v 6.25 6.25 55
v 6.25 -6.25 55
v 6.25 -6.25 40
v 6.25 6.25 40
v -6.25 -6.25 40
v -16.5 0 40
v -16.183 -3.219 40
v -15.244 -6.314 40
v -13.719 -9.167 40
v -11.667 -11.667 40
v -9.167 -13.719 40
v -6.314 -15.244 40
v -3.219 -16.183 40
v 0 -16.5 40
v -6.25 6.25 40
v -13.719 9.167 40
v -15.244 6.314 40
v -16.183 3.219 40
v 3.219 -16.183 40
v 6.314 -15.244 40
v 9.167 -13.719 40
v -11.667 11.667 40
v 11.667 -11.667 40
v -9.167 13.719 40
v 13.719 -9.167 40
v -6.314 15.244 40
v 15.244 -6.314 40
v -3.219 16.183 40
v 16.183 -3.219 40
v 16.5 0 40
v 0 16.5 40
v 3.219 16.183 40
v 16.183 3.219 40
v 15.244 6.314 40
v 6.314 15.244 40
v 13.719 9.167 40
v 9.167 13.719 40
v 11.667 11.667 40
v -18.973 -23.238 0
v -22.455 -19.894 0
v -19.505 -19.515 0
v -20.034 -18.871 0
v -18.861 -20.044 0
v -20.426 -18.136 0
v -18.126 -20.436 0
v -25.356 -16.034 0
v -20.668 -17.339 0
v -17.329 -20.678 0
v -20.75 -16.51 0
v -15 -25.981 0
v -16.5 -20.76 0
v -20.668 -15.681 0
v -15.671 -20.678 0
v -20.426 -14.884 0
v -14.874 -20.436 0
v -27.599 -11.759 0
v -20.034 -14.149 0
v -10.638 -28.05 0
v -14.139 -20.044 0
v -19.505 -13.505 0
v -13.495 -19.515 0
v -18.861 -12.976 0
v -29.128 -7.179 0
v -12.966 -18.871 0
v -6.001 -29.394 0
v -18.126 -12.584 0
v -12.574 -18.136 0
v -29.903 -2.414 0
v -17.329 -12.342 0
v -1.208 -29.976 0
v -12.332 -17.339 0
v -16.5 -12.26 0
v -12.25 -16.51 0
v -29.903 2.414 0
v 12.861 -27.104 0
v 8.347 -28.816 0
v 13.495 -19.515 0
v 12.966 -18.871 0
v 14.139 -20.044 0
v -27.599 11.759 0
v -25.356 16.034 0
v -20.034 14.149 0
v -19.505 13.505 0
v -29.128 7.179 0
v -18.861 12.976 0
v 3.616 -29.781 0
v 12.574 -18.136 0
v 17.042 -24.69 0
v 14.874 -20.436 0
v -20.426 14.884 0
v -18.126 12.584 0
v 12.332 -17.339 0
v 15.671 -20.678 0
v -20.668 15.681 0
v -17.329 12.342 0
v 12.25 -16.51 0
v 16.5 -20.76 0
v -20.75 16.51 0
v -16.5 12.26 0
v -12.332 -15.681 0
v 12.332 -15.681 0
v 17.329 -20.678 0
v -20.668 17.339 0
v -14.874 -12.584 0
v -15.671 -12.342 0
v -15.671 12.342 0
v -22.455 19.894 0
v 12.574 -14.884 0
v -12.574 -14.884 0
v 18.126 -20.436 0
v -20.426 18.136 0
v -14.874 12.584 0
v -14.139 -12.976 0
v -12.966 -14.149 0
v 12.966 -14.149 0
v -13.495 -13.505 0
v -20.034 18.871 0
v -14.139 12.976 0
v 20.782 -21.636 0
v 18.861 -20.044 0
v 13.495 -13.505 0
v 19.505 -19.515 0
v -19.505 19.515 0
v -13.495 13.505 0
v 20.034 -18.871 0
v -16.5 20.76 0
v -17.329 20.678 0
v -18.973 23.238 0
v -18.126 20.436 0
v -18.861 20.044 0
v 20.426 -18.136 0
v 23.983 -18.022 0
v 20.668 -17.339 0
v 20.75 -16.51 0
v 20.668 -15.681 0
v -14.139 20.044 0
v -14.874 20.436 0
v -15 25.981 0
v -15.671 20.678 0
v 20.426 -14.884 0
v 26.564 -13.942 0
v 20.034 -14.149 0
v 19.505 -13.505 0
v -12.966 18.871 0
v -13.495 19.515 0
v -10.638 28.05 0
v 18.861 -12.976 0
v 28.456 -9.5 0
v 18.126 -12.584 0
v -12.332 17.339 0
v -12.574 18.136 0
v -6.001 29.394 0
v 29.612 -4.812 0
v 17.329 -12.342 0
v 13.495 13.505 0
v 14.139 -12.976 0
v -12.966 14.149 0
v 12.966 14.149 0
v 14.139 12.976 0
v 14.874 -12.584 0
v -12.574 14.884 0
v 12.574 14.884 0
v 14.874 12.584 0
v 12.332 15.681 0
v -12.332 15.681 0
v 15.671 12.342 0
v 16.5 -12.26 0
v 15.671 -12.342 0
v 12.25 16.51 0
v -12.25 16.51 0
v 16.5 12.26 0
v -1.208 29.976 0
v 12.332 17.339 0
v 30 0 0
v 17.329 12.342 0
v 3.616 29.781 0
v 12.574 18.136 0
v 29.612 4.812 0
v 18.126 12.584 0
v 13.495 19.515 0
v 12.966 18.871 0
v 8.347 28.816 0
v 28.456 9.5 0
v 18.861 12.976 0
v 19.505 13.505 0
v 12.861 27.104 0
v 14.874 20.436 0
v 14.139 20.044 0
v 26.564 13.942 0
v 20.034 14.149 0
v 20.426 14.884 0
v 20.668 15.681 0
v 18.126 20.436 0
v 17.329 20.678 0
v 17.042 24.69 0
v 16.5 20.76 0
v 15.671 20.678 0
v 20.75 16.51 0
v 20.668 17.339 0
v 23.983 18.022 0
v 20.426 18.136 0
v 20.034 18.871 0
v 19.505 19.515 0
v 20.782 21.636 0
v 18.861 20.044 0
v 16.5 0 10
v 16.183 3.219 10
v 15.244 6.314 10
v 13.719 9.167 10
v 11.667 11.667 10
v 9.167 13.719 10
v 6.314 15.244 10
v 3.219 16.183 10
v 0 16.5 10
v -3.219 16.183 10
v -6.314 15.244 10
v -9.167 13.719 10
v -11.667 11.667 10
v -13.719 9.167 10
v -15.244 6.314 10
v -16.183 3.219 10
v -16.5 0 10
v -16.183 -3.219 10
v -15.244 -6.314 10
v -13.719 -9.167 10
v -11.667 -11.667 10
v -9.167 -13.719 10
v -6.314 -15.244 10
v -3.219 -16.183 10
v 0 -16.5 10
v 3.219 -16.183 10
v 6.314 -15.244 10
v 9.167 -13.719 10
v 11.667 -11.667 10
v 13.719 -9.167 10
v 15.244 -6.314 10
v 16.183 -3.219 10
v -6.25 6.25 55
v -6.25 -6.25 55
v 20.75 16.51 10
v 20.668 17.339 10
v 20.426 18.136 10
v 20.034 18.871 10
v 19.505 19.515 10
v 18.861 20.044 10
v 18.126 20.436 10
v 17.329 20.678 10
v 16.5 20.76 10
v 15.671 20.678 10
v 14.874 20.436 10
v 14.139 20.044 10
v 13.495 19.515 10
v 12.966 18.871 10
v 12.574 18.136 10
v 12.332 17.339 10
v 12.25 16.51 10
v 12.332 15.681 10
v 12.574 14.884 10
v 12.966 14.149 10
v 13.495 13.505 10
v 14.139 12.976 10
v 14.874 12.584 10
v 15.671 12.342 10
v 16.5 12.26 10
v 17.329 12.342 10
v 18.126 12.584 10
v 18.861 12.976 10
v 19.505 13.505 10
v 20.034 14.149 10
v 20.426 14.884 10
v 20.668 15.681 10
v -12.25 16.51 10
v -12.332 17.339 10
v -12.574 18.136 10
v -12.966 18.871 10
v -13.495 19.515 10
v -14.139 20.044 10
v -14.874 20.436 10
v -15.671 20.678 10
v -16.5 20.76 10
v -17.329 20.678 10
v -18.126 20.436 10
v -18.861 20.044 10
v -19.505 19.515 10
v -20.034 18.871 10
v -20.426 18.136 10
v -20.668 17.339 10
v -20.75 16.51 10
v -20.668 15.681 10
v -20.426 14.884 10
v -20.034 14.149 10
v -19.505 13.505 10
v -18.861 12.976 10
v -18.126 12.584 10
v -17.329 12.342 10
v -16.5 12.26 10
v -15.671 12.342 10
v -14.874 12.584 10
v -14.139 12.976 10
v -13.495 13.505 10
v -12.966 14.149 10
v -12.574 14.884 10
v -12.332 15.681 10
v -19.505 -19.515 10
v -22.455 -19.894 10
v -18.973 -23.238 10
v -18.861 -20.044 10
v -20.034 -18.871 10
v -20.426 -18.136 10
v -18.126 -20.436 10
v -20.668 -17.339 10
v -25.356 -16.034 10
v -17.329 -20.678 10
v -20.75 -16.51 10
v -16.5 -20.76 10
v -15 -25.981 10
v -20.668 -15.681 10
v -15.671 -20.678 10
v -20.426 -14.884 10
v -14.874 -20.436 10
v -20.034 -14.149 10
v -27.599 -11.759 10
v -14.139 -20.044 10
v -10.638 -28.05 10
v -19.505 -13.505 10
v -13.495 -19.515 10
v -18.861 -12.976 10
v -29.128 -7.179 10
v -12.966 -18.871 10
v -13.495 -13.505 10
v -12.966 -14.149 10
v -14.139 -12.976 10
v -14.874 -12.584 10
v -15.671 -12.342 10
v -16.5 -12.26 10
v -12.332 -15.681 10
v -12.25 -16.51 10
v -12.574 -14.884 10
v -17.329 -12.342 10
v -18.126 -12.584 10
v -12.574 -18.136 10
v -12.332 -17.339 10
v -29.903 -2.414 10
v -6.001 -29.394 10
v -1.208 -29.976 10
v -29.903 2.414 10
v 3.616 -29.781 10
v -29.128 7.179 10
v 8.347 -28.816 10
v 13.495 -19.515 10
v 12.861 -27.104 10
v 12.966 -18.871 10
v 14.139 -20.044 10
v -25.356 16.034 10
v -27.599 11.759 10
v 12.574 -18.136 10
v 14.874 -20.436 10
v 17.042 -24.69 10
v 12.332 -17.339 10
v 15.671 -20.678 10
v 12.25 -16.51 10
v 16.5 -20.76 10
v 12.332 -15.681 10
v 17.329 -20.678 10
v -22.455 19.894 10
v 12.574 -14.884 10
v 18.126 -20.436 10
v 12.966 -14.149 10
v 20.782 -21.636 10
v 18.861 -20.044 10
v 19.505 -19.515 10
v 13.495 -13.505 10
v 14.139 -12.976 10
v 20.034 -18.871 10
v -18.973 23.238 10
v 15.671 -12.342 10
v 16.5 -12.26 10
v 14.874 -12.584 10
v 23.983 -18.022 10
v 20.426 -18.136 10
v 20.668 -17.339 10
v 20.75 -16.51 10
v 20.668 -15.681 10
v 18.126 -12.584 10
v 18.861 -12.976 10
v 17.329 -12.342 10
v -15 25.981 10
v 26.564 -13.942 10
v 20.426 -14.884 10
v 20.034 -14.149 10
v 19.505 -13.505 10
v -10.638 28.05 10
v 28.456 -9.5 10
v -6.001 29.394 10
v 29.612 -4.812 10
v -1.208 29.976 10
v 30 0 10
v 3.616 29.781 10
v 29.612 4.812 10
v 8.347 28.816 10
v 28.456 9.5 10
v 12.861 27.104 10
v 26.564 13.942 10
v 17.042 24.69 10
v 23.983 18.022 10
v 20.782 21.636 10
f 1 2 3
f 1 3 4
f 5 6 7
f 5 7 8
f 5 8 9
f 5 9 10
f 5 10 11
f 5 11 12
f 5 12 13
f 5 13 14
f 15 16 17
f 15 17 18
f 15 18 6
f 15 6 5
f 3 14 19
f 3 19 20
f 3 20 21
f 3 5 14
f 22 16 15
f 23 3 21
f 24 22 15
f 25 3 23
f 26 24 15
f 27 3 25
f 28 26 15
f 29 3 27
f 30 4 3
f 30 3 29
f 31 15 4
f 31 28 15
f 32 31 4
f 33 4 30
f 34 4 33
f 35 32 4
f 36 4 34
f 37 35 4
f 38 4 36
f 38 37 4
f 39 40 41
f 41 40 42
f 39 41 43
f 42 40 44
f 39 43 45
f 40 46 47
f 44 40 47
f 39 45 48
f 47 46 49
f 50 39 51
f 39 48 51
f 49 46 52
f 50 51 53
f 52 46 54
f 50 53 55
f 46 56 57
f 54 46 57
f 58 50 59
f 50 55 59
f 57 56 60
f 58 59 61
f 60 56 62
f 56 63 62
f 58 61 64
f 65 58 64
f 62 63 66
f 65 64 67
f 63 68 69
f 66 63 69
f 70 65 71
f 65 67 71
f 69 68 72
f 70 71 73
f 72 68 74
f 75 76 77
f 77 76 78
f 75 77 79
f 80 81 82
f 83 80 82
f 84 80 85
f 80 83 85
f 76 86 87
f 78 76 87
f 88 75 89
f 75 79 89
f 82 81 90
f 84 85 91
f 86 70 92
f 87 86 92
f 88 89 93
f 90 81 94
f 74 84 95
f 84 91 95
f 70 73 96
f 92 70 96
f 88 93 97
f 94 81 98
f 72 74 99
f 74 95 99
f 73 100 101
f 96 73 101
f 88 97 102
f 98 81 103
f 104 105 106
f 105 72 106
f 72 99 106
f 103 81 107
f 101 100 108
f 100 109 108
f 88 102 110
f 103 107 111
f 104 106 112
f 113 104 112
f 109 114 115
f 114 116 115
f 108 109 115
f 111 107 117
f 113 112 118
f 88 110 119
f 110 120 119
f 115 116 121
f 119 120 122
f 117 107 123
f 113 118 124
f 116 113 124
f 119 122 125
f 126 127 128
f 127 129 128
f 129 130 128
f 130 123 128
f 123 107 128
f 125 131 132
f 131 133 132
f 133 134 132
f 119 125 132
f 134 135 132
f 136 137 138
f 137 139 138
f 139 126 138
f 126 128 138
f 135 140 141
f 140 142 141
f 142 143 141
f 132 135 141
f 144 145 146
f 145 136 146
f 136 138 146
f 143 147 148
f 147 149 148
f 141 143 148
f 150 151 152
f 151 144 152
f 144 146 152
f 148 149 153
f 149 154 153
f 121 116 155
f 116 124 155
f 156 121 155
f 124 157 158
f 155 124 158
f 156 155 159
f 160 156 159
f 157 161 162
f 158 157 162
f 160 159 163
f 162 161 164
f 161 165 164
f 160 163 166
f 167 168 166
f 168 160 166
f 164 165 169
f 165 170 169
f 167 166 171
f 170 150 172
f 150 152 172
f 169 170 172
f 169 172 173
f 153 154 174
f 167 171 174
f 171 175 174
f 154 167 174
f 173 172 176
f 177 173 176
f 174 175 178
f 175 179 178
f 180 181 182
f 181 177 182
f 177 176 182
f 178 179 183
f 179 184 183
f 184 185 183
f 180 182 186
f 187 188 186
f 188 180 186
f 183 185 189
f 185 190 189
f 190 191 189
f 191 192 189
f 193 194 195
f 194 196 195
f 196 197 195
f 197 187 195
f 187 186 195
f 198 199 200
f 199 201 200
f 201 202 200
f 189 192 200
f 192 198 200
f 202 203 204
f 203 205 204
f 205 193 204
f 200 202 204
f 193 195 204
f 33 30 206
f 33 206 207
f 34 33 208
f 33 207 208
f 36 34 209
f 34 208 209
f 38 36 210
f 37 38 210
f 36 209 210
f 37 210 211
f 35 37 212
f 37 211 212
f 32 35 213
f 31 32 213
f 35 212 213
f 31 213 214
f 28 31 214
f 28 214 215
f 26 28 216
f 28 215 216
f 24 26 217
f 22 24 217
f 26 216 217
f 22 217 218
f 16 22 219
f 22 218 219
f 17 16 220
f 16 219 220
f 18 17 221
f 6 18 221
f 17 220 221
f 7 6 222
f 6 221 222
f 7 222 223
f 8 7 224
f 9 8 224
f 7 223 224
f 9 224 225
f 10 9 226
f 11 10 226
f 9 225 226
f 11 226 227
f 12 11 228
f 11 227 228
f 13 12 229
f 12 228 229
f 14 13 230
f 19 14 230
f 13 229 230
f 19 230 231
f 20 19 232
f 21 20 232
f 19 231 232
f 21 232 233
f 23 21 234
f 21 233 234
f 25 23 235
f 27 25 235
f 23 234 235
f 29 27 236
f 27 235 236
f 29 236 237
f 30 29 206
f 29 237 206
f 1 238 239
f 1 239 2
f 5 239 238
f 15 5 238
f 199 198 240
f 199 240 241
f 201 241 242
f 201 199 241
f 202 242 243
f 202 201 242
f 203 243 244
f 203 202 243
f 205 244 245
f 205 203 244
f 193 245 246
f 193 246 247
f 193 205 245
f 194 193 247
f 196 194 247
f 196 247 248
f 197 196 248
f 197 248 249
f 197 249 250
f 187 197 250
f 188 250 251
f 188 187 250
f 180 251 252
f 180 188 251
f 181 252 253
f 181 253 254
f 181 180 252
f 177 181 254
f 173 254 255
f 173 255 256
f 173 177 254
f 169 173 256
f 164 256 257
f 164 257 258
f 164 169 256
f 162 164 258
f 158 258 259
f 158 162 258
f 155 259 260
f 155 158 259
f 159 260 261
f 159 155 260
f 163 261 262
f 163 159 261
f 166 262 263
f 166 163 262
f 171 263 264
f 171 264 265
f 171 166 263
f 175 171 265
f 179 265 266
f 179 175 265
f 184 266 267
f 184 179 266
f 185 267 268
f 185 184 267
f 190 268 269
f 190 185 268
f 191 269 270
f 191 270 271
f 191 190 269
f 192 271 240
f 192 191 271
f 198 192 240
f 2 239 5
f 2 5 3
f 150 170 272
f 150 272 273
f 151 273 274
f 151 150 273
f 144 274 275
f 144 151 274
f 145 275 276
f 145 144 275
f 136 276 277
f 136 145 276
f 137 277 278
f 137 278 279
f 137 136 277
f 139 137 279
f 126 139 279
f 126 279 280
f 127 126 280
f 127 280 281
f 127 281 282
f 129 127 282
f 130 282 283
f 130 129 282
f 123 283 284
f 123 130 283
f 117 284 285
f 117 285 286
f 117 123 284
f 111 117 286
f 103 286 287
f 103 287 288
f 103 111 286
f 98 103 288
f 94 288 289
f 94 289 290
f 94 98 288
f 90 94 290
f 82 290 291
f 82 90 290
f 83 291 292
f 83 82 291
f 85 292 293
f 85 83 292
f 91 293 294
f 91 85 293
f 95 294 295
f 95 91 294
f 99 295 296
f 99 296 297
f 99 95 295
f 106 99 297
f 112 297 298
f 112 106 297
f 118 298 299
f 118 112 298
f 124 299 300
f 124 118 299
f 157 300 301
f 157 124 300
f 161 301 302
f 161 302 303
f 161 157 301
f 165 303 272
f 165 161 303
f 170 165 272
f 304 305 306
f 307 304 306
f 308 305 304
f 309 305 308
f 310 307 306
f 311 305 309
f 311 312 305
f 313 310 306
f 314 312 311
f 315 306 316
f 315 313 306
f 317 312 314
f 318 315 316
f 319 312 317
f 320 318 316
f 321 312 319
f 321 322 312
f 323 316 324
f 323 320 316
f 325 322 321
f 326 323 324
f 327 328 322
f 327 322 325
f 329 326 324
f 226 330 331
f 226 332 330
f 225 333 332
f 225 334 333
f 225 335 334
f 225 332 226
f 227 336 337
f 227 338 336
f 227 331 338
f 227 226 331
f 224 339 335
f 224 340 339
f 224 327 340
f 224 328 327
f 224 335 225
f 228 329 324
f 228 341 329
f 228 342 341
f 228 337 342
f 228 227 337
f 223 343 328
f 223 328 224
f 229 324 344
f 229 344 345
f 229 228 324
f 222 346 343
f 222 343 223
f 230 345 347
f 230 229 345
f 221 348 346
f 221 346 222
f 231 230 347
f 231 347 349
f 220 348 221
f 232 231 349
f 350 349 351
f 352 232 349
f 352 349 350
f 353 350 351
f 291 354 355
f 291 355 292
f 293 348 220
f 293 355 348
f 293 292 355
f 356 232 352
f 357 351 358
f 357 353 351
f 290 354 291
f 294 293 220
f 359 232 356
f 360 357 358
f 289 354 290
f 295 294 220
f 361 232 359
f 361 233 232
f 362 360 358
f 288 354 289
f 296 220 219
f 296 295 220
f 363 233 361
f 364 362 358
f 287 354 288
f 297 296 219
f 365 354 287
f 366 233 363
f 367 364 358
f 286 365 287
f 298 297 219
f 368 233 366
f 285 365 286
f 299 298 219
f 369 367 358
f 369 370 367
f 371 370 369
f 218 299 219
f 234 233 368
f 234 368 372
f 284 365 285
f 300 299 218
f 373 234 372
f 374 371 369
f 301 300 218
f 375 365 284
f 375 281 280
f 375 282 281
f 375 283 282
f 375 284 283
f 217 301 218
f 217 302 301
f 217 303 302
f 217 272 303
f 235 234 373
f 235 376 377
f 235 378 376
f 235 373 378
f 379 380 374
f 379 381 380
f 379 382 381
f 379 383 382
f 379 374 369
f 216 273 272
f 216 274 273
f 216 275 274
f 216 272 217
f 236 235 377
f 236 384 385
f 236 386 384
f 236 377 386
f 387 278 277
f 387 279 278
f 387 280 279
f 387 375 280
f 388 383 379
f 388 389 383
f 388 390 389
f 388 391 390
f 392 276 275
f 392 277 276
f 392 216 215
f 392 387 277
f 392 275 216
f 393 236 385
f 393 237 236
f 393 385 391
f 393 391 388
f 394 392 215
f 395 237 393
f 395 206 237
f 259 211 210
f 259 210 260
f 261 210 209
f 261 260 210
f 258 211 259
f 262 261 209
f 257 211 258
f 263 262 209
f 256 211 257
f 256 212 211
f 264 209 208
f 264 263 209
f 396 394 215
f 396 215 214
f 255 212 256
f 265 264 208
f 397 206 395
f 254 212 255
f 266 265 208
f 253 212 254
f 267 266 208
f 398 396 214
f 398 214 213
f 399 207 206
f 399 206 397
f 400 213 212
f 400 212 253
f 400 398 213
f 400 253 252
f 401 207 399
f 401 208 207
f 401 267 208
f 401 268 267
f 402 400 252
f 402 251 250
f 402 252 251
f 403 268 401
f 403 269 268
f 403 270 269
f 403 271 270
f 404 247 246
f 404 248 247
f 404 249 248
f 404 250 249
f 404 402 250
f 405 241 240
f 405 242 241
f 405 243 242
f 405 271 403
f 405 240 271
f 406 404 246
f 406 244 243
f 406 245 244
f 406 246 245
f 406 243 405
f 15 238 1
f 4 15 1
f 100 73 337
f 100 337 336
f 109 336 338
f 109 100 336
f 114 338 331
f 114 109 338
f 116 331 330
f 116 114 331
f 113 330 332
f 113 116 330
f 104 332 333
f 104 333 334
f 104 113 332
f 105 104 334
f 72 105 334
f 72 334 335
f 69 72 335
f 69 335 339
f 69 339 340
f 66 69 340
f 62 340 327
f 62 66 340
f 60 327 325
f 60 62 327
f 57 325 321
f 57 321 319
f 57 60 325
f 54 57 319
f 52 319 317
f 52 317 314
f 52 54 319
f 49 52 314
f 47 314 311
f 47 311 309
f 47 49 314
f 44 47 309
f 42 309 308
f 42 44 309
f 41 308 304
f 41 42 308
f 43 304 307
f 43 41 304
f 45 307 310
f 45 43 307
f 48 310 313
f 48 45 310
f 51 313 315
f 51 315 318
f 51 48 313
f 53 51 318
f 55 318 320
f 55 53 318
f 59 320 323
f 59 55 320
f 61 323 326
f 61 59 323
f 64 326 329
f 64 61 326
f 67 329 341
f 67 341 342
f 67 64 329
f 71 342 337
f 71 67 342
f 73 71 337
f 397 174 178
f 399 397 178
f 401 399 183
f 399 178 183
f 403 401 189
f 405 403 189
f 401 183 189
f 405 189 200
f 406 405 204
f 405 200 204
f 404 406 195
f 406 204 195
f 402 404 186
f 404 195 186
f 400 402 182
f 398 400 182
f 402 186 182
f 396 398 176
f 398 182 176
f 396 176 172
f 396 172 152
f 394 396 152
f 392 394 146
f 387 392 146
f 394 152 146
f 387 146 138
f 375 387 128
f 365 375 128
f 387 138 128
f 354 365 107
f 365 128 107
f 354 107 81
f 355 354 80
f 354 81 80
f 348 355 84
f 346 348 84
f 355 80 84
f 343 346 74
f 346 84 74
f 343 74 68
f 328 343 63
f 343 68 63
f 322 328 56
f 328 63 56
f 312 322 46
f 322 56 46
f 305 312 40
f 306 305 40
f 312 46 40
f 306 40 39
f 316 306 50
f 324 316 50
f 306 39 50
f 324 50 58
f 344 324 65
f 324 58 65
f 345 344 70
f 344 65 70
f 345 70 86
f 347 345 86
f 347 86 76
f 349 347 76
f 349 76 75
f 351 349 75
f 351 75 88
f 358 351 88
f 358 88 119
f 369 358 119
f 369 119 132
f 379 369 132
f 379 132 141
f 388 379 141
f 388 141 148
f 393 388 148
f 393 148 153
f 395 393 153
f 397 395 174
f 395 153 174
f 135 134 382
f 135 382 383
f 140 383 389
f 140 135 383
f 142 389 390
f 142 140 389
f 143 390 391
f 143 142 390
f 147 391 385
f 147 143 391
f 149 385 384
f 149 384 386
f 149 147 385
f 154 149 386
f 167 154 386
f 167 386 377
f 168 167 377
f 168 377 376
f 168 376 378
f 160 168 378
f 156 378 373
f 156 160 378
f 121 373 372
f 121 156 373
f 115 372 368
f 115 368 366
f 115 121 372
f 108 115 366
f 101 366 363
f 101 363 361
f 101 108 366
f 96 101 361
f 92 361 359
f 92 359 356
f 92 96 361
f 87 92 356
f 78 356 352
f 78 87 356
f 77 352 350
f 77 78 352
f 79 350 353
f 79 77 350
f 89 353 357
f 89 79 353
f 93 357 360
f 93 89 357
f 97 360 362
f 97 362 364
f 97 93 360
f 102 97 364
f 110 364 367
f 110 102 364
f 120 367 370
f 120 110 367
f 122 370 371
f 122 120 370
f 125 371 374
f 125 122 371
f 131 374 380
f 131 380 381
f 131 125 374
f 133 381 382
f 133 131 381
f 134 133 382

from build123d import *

# Parameters (mm, degrees)
F0_R     = 30
F0_R_2   = 4.25
F1_DEPTH = 10
F2_R     = 16.5
F3_DEPTH = 30
F4_W     = 12.5
F4_H     = 12.5
F5_DEPTH = 15


with BuildPart() as f1:
    # F0 (on Top) → F1 (new body)
    with BuildSketch(Plane.XY):
        Circle(F0_R)
        with Locations((-16.5, -16.51)):
            Circle(F0_R_2, mode=Mode.SUBTRACT)
        with Locations((16.5, -16.51)):
            Circle(F0_R_2, mode=Mode.SUBTRACT)
        with Locations((-16.5, 16.51)):
            Circle(F0_R_2, mode=Mode.SUBTRACT)
        with Locations((16.5, 16.51)):
            Circle(F0_R_2, mode=Mode.SUBTRACT)
    extrude(amount=F1_DEPTH)

    # F2 (on face) → F3 (join)
    with BuildSketch(Plane.XY.offset(10)):
        Circle(F2_R)
    extrude(amount=F3_DEPTH)

    # F4 (on face) → F5 (join)
    with BuildSketch(Plane.XY.offset(40)):
        Rectangle(F4_W, F4_H)
    extrude(amount=F5_DEPTH)


solid = f1.part
